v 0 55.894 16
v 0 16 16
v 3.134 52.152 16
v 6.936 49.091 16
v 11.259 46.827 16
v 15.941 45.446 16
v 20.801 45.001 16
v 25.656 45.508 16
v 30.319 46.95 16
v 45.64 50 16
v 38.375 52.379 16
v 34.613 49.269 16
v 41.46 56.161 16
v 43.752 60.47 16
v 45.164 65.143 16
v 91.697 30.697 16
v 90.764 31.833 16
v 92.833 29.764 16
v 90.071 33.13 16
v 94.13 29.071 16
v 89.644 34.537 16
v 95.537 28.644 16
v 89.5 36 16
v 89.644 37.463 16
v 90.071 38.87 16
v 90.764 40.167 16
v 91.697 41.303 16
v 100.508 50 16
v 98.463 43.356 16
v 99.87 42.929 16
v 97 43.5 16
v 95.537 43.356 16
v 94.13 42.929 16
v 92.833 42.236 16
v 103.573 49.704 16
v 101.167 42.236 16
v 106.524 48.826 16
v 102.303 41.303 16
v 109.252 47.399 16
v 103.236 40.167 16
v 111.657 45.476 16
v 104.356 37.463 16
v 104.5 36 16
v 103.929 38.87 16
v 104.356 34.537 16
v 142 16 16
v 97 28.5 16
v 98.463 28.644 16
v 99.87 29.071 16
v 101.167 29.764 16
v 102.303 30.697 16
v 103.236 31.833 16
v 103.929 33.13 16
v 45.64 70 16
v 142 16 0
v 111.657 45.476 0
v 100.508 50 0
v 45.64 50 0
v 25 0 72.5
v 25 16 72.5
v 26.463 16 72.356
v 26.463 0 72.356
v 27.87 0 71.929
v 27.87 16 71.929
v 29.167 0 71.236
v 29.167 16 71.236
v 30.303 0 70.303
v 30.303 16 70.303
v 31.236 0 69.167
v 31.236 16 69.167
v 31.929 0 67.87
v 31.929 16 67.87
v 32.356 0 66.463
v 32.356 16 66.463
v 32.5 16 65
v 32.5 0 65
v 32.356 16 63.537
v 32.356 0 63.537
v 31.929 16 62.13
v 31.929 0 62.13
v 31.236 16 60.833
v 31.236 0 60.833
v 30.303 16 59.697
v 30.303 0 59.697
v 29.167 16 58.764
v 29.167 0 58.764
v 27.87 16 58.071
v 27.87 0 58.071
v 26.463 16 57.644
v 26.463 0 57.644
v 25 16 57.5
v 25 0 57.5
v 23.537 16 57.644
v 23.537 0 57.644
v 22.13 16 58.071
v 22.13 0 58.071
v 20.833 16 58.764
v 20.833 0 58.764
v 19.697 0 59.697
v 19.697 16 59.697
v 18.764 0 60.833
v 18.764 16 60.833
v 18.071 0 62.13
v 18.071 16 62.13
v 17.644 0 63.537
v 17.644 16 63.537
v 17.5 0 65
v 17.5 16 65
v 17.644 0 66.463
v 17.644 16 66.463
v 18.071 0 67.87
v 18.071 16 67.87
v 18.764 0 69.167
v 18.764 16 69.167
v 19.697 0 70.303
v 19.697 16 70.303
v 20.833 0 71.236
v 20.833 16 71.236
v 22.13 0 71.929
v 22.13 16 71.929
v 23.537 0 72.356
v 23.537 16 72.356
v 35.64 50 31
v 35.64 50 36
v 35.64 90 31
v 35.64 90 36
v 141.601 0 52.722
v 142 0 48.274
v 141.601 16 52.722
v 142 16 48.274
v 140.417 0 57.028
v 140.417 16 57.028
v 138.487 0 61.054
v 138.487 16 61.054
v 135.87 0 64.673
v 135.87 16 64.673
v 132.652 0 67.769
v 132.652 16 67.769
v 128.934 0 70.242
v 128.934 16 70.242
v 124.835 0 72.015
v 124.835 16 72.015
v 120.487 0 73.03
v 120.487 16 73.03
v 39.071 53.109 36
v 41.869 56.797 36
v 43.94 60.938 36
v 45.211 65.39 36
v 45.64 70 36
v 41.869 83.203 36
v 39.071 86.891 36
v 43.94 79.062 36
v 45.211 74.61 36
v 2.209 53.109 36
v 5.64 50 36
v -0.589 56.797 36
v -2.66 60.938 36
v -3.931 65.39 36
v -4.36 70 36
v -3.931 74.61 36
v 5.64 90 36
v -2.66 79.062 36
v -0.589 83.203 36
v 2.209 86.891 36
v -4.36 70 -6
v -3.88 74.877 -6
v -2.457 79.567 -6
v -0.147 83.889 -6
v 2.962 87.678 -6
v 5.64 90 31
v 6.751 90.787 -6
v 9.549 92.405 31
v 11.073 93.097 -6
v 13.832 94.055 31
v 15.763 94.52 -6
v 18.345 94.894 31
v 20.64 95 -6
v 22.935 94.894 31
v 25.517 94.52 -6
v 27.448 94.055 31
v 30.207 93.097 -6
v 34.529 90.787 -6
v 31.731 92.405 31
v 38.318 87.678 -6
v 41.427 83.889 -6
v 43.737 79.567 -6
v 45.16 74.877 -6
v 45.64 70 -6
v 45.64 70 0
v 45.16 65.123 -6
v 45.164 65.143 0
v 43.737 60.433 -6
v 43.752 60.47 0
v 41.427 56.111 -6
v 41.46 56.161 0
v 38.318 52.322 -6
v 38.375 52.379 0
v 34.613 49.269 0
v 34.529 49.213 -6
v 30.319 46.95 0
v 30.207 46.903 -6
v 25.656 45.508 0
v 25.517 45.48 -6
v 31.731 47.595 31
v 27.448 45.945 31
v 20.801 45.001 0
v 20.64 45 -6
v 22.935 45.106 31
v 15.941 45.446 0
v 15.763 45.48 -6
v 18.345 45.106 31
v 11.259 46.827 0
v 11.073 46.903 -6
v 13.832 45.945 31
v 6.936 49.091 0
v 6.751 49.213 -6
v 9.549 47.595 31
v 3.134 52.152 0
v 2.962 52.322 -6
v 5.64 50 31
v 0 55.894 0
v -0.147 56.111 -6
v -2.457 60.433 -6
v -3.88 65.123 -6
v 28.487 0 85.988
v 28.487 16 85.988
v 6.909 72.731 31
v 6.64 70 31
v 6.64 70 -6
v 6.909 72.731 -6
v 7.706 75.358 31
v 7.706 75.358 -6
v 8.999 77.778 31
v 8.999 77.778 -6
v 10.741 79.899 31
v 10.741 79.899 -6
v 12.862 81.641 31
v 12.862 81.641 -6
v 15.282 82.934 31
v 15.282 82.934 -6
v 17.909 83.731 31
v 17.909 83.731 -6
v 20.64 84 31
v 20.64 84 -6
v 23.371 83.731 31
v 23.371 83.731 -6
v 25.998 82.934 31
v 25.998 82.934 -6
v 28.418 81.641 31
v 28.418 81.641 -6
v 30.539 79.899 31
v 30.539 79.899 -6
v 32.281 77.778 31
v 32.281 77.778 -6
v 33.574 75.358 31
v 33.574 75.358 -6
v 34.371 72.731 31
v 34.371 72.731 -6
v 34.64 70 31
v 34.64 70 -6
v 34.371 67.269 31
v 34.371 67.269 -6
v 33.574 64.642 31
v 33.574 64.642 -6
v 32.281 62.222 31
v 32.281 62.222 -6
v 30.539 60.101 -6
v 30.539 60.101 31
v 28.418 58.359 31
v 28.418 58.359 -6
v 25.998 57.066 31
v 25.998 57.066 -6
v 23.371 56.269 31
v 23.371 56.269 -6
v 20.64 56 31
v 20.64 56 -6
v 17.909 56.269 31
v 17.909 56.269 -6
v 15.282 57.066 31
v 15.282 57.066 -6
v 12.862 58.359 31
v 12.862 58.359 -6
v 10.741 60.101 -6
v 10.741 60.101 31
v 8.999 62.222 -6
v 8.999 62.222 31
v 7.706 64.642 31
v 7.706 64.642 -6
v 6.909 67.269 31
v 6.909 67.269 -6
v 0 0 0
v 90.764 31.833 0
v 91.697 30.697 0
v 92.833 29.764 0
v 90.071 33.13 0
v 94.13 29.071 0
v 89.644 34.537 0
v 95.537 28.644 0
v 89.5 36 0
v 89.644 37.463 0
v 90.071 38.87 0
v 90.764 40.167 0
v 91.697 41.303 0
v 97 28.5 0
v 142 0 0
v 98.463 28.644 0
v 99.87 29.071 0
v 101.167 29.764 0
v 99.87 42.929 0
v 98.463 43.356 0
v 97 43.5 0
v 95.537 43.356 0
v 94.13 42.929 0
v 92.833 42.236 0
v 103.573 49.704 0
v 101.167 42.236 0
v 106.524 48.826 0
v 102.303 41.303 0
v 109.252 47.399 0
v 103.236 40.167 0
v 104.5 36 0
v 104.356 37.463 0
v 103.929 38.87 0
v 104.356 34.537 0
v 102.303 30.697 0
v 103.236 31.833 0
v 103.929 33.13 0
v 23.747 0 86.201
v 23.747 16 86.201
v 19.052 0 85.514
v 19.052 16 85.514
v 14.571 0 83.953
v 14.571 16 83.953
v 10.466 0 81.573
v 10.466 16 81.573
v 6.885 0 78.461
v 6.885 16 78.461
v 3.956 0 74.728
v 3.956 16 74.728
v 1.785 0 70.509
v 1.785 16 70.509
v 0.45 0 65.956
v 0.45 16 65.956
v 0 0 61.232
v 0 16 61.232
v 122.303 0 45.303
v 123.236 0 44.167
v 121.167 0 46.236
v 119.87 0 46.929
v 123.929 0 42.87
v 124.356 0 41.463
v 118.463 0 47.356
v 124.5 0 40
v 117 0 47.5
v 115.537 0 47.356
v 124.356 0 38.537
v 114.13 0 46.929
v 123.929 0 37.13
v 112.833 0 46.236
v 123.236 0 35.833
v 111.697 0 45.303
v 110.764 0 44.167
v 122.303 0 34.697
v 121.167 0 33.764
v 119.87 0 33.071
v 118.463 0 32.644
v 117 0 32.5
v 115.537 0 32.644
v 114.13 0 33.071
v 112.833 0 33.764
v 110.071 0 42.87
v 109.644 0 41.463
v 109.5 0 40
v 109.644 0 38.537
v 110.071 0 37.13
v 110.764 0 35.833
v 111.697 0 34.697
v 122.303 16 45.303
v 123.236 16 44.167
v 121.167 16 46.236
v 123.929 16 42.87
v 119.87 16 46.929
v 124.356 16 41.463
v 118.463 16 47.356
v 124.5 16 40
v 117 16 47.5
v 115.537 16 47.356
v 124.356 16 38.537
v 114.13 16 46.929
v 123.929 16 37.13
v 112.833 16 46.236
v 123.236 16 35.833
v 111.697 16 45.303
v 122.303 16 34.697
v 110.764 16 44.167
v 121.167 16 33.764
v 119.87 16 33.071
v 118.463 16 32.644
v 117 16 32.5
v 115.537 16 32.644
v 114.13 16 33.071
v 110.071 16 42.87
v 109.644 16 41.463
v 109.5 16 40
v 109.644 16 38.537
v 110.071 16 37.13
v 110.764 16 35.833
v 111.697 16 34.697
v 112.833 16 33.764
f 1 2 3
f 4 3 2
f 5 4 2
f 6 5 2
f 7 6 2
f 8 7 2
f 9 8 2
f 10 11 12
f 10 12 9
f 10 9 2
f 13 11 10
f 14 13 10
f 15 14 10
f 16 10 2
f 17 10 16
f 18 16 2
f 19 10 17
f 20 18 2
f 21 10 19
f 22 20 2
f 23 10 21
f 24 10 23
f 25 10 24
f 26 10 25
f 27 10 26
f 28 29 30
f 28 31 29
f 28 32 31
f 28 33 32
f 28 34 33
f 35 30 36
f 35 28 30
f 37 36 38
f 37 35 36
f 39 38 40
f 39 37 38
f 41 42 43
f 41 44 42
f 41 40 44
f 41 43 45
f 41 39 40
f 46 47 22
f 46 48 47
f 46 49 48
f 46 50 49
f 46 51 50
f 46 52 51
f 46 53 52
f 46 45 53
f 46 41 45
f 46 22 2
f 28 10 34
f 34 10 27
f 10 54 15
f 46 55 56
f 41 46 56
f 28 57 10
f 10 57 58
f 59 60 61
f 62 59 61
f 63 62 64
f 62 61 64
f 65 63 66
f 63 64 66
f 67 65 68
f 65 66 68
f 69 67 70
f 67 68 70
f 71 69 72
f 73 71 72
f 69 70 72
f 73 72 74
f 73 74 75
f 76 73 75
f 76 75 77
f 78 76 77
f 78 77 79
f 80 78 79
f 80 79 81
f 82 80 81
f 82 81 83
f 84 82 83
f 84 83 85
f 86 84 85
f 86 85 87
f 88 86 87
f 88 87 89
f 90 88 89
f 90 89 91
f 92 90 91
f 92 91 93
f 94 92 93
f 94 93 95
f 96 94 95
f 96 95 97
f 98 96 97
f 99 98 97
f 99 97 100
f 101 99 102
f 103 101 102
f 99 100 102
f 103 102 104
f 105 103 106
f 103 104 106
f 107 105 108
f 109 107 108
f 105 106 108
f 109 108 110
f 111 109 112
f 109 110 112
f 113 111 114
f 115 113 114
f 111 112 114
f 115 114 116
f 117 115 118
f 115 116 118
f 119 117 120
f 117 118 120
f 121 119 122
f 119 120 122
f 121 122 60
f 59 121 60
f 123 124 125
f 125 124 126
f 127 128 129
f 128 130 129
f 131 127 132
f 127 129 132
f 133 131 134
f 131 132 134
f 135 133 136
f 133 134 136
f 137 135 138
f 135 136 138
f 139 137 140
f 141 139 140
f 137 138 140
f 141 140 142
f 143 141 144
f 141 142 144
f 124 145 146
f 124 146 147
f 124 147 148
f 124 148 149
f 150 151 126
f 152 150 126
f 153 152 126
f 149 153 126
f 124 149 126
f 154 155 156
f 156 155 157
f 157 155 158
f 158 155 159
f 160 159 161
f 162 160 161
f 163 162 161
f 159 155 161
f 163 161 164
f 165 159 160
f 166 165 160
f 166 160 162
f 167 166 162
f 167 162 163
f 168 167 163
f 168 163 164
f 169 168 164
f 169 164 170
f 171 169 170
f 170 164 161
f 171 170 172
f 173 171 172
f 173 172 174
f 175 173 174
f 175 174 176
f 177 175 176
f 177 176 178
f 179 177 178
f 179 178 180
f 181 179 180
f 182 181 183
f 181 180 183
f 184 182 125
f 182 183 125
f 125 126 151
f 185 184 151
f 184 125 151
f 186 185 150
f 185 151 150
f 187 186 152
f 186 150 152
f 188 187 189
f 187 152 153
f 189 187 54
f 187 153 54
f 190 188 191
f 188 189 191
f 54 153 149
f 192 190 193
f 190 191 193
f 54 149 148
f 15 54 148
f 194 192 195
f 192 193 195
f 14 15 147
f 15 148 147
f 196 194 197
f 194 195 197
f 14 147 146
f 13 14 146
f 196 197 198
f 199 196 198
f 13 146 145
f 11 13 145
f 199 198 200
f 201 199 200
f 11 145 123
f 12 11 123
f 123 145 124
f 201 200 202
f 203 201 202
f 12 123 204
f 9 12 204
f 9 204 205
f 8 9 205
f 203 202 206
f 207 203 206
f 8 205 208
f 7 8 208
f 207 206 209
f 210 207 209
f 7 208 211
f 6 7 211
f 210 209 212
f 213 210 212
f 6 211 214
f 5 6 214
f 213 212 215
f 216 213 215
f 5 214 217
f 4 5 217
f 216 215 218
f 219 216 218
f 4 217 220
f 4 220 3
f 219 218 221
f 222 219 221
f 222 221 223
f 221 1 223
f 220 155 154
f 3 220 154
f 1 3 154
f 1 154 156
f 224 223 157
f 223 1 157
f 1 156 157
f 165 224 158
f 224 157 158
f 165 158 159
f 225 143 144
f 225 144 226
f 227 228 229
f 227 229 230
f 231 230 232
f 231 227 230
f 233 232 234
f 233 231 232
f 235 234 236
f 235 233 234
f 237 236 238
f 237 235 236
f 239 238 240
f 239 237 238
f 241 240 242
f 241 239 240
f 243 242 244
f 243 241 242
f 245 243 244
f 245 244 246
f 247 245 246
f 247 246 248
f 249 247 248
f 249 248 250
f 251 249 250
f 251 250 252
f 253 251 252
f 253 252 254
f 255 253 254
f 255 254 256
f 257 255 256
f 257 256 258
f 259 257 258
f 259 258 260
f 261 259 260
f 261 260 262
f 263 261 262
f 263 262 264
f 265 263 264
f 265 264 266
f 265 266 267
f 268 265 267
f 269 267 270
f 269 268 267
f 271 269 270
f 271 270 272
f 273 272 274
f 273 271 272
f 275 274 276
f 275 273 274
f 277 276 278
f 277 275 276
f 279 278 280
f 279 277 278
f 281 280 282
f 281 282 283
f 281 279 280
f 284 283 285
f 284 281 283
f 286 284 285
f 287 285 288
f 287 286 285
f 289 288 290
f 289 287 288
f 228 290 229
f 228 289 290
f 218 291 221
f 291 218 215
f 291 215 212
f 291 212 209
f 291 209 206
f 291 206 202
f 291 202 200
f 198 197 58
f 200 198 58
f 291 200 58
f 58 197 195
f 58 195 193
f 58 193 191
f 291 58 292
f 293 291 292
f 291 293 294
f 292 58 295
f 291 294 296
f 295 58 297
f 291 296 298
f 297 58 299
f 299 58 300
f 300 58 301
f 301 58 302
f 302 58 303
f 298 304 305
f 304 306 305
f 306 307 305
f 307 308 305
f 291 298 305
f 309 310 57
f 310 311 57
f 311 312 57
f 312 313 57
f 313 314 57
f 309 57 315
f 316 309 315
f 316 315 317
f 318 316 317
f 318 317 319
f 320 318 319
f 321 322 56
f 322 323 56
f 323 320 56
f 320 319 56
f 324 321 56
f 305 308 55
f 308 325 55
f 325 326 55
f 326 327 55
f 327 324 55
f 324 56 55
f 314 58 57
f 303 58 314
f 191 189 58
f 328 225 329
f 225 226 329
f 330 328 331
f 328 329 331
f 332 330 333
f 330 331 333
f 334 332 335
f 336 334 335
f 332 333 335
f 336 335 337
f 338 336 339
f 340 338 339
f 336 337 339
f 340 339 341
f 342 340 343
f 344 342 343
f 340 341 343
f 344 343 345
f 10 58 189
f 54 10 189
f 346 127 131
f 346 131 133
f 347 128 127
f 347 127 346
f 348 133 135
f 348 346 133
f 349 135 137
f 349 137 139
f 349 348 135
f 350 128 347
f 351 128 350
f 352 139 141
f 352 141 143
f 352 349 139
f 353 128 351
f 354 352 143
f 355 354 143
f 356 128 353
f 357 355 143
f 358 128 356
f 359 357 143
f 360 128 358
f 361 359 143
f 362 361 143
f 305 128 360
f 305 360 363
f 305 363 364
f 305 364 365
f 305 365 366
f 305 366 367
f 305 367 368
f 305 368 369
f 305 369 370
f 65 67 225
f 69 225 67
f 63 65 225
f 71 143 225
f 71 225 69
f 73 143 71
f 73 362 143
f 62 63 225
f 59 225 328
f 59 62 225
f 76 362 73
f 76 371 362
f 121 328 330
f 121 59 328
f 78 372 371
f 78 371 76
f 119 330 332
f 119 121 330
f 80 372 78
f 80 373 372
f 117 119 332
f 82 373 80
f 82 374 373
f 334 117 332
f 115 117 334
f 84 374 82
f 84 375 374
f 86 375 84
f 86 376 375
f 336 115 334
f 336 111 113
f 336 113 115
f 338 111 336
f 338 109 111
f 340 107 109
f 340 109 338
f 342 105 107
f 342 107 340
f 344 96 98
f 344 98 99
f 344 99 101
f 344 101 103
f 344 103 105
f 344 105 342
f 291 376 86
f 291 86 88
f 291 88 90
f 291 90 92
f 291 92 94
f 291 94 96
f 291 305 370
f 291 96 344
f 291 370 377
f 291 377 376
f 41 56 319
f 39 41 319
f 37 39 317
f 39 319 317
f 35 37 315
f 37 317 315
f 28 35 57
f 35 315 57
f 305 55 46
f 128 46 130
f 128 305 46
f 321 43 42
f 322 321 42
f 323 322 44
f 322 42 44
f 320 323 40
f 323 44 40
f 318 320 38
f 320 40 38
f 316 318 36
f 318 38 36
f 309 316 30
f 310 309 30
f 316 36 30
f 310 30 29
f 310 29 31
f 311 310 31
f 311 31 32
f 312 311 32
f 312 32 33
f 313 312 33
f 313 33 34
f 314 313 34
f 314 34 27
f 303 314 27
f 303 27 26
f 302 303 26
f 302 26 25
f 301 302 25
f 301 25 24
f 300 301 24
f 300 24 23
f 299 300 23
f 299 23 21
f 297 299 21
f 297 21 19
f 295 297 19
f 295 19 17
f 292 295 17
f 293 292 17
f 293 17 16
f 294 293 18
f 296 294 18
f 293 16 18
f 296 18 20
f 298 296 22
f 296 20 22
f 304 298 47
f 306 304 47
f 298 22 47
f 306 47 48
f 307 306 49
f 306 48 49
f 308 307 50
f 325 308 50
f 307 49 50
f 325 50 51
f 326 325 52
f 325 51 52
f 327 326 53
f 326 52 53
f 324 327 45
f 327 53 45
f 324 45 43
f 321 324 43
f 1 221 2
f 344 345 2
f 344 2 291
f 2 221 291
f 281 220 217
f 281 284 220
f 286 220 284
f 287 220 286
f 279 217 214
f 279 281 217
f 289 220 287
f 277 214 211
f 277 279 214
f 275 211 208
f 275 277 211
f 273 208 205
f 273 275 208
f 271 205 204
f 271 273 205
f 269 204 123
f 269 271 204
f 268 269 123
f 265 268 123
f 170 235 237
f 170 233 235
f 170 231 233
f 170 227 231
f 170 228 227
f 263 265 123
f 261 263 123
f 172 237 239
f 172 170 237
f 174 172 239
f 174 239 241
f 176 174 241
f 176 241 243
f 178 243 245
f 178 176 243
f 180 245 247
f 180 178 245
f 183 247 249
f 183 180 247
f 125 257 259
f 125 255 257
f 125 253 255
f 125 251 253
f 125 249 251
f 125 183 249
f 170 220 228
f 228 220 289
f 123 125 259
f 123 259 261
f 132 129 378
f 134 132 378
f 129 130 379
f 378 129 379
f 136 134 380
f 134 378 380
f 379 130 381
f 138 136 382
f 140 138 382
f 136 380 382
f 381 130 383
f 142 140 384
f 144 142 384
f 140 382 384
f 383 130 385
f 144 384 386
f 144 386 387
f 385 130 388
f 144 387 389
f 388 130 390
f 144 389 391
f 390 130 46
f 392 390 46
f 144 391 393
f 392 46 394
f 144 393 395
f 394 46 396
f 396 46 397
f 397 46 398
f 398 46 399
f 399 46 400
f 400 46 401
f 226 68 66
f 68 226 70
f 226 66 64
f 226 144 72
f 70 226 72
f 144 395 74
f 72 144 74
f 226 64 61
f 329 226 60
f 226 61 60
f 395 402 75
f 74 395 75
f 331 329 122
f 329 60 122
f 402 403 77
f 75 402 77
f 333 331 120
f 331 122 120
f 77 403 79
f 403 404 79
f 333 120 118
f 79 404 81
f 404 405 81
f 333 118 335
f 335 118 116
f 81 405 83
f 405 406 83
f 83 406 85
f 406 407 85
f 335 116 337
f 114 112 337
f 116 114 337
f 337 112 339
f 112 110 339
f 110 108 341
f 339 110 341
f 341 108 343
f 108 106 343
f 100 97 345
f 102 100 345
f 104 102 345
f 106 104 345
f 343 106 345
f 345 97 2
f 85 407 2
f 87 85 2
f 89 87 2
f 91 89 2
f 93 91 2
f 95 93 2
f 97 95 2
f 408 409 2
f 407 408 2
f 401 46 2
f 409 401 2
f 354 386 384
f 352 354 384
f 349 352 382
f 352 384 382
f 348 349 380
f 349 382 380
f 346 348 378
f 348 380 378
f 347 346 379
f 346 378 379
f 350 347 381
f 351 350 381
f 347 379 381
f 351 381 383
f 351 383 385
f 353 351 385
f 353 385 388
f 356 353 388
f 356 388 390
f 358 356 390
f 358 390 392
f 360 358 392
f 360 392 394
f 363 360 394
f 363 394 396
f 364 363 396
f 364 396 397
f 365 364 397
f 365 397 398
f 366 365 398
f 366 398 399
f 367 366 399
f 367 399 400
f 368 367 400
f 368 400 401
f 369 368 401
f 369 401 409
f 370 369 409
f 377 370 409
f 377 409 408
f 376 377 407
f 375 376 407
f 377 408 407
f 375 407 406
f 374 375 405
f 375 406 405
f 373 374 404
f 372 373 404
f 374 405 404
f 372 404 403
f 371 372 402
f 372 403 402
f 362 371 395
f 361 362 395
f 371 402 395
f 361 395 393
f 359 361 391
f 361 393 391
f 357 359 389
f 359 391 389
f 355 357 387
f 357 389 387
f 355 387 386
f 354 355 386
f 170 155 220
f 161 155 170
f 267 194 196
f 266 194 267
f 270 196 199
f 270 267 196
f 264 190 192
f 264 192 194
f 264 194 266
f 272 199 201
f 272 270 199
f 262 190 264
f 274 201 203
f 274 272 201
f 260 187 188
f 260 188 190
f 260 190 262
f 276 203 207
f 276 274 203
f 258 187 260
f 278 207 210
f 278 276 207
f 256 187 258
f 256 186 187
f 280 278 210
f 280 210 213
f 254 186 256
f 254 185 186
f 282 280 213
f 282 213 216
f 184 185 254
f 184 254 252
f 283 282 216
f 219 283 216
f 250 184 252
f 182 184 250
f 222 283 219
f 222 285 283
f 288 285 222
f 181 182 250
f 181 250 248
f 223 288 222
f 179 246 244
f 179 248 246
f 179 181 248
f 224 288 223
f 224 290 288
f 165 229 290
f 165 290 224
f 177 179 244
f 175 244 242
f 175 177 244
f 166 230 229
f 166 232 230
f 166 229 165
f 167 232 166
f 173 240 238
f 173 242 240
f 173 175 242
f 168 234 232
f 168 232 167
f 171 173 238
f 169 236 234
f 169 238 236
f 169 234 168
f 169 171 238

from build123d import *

# Parameters (mm, degrees)
BOSS_EXTRUDE1_DEPTH      = 16
FILLET1_R                = 25
SKETCH2_R                = 7.5
CUT_EXTRUDE1_DEPTH       = 167.901106215
BOSS_EXTRUDE2_DEPTH      = 6
BOSS_EXTRUDE2_DEPTH_BACK = 36
SKETCH3_R                = 25
SKETCH3_R_2              = 14
BOSS_EXTRUDE3_DEPTH      = 16
SKETCH5_R                = 7.5
CUT_EXTRUDE2_DEPTH       = 185.720197269
SKETCH6_W                = 30
SKETCH6_H                = 60
CUT_EXTRUDE3_DEPTH       = 5


with BuildPart() as part:
    # Sketch1 → Boss-Extrude1 (new body)
    with BuildSketch(Plane(origin=(0, 0, 0), x_dir=(1, 0, 0), z_dir=(0, 1, 0))):
        Polygon((0, 0), (142, 0), (142, -70), (0, -90), align=None)
    extrude(amount=BOSS_EXTRUDE1_DEPTH)

    # Fillet1
    fillet1_edges = [part.edges().sort_by_distance(p)[0] for p in [
        (142, 8, 70),
        (0, 8, 90),
    ]]
    fillet(fillet1_edges, radius=FILLET1_R)

    # Sketch2 → Cut-Extrude1 (cut, through all)
    with BuildSketch(Plane(origin=(0, 16, 0), x_dir=(1, 0, 0), z_dir=(0, 1, 0))):
        with Locations(Location((25, -65, 0), (0, 0, 270))):
            Circle(SKETCH2_R)
        with Locations(Location((117, -40, 0), (0, 0, 270))):
            Circle(SKETCH2_R)
    extrude(amount=-CUT_EXTRUDE1_DEPTH, mode=Mode.SUBTRACT)



with BuildPart() as body_2:
    # Sketch3 → Boss-Extrude2 (new, two sides: drawn at the far end of the back side and taken through both)
    with BuildSketch(Plane(origin=(0, 0, 0), x_dir=(-1, 0, 0), z_dir=(0, 0, -1)).offset(-BOSS_EXTRUDE2_DEPTH_BACK)):
        with Locations((-20.64, 70)):
            Circle(SKETCH3_R)
        with Locations((-20.64, 70)):
            Circle(SKETCH3_R_2, mode=Mode.SUBTRACT)
    extrude(amount=BOSS_EXTRUDE2_DEPTH + BOSS_EXTRUDE2_DEPTH_BACK)


with BuildPart() as part_1:
    add(part.part)

    add(body_2.part)  # Boss-Extrude3 merges body 2
    # Sketch4 → Boss-Extrude3 (add)
    with BuildSketch(Plane.XY):
        with BuildLine():
            Line((142, 16), (111.656574903, 45.476470094))
            ThreePointArc((111.656574903, 45.476470094), (106.523670107, 48.826050072), (100.508003955, 50))
            Line((100.508003955, 50), (45.64, 50))
            Line((45.64, 50), (45.64, 70))
            ThreePointArc((45.64, 70), (28.02241153, 46.114858175), (0, 55.893604287))
            Line((0, 55.893604287), (0, 16))
            Line((0, 16), (142, 16))
        make_face()
    extrude(amount=BOSS_EXTRUDE3_DEPTH)

    # Sketch5 → Cut-Extrude2 (cut, through all)
    with BuildSketch(Plane.XY.offset(16)):
        with Locations((97, 36)):
            Circle(SKETCH5_R)
    extrude(amount=-CUT_EXTRUDE2_DEPTH, mode=Mode.SUBTRACT)

    # Sketch6 → Cut-Extrude3 (cut)
    with BuildSketch(Plane.XY.offset(36)):
        with Locations((20.64, 70)):
            Rectangle(SKETCH6_W, SKETCH6_H)
    extrude(amount=-CUT_EXTRUDE3_DEPTH, mode=Mode.SUBTRACT)


solid = part_1.part
